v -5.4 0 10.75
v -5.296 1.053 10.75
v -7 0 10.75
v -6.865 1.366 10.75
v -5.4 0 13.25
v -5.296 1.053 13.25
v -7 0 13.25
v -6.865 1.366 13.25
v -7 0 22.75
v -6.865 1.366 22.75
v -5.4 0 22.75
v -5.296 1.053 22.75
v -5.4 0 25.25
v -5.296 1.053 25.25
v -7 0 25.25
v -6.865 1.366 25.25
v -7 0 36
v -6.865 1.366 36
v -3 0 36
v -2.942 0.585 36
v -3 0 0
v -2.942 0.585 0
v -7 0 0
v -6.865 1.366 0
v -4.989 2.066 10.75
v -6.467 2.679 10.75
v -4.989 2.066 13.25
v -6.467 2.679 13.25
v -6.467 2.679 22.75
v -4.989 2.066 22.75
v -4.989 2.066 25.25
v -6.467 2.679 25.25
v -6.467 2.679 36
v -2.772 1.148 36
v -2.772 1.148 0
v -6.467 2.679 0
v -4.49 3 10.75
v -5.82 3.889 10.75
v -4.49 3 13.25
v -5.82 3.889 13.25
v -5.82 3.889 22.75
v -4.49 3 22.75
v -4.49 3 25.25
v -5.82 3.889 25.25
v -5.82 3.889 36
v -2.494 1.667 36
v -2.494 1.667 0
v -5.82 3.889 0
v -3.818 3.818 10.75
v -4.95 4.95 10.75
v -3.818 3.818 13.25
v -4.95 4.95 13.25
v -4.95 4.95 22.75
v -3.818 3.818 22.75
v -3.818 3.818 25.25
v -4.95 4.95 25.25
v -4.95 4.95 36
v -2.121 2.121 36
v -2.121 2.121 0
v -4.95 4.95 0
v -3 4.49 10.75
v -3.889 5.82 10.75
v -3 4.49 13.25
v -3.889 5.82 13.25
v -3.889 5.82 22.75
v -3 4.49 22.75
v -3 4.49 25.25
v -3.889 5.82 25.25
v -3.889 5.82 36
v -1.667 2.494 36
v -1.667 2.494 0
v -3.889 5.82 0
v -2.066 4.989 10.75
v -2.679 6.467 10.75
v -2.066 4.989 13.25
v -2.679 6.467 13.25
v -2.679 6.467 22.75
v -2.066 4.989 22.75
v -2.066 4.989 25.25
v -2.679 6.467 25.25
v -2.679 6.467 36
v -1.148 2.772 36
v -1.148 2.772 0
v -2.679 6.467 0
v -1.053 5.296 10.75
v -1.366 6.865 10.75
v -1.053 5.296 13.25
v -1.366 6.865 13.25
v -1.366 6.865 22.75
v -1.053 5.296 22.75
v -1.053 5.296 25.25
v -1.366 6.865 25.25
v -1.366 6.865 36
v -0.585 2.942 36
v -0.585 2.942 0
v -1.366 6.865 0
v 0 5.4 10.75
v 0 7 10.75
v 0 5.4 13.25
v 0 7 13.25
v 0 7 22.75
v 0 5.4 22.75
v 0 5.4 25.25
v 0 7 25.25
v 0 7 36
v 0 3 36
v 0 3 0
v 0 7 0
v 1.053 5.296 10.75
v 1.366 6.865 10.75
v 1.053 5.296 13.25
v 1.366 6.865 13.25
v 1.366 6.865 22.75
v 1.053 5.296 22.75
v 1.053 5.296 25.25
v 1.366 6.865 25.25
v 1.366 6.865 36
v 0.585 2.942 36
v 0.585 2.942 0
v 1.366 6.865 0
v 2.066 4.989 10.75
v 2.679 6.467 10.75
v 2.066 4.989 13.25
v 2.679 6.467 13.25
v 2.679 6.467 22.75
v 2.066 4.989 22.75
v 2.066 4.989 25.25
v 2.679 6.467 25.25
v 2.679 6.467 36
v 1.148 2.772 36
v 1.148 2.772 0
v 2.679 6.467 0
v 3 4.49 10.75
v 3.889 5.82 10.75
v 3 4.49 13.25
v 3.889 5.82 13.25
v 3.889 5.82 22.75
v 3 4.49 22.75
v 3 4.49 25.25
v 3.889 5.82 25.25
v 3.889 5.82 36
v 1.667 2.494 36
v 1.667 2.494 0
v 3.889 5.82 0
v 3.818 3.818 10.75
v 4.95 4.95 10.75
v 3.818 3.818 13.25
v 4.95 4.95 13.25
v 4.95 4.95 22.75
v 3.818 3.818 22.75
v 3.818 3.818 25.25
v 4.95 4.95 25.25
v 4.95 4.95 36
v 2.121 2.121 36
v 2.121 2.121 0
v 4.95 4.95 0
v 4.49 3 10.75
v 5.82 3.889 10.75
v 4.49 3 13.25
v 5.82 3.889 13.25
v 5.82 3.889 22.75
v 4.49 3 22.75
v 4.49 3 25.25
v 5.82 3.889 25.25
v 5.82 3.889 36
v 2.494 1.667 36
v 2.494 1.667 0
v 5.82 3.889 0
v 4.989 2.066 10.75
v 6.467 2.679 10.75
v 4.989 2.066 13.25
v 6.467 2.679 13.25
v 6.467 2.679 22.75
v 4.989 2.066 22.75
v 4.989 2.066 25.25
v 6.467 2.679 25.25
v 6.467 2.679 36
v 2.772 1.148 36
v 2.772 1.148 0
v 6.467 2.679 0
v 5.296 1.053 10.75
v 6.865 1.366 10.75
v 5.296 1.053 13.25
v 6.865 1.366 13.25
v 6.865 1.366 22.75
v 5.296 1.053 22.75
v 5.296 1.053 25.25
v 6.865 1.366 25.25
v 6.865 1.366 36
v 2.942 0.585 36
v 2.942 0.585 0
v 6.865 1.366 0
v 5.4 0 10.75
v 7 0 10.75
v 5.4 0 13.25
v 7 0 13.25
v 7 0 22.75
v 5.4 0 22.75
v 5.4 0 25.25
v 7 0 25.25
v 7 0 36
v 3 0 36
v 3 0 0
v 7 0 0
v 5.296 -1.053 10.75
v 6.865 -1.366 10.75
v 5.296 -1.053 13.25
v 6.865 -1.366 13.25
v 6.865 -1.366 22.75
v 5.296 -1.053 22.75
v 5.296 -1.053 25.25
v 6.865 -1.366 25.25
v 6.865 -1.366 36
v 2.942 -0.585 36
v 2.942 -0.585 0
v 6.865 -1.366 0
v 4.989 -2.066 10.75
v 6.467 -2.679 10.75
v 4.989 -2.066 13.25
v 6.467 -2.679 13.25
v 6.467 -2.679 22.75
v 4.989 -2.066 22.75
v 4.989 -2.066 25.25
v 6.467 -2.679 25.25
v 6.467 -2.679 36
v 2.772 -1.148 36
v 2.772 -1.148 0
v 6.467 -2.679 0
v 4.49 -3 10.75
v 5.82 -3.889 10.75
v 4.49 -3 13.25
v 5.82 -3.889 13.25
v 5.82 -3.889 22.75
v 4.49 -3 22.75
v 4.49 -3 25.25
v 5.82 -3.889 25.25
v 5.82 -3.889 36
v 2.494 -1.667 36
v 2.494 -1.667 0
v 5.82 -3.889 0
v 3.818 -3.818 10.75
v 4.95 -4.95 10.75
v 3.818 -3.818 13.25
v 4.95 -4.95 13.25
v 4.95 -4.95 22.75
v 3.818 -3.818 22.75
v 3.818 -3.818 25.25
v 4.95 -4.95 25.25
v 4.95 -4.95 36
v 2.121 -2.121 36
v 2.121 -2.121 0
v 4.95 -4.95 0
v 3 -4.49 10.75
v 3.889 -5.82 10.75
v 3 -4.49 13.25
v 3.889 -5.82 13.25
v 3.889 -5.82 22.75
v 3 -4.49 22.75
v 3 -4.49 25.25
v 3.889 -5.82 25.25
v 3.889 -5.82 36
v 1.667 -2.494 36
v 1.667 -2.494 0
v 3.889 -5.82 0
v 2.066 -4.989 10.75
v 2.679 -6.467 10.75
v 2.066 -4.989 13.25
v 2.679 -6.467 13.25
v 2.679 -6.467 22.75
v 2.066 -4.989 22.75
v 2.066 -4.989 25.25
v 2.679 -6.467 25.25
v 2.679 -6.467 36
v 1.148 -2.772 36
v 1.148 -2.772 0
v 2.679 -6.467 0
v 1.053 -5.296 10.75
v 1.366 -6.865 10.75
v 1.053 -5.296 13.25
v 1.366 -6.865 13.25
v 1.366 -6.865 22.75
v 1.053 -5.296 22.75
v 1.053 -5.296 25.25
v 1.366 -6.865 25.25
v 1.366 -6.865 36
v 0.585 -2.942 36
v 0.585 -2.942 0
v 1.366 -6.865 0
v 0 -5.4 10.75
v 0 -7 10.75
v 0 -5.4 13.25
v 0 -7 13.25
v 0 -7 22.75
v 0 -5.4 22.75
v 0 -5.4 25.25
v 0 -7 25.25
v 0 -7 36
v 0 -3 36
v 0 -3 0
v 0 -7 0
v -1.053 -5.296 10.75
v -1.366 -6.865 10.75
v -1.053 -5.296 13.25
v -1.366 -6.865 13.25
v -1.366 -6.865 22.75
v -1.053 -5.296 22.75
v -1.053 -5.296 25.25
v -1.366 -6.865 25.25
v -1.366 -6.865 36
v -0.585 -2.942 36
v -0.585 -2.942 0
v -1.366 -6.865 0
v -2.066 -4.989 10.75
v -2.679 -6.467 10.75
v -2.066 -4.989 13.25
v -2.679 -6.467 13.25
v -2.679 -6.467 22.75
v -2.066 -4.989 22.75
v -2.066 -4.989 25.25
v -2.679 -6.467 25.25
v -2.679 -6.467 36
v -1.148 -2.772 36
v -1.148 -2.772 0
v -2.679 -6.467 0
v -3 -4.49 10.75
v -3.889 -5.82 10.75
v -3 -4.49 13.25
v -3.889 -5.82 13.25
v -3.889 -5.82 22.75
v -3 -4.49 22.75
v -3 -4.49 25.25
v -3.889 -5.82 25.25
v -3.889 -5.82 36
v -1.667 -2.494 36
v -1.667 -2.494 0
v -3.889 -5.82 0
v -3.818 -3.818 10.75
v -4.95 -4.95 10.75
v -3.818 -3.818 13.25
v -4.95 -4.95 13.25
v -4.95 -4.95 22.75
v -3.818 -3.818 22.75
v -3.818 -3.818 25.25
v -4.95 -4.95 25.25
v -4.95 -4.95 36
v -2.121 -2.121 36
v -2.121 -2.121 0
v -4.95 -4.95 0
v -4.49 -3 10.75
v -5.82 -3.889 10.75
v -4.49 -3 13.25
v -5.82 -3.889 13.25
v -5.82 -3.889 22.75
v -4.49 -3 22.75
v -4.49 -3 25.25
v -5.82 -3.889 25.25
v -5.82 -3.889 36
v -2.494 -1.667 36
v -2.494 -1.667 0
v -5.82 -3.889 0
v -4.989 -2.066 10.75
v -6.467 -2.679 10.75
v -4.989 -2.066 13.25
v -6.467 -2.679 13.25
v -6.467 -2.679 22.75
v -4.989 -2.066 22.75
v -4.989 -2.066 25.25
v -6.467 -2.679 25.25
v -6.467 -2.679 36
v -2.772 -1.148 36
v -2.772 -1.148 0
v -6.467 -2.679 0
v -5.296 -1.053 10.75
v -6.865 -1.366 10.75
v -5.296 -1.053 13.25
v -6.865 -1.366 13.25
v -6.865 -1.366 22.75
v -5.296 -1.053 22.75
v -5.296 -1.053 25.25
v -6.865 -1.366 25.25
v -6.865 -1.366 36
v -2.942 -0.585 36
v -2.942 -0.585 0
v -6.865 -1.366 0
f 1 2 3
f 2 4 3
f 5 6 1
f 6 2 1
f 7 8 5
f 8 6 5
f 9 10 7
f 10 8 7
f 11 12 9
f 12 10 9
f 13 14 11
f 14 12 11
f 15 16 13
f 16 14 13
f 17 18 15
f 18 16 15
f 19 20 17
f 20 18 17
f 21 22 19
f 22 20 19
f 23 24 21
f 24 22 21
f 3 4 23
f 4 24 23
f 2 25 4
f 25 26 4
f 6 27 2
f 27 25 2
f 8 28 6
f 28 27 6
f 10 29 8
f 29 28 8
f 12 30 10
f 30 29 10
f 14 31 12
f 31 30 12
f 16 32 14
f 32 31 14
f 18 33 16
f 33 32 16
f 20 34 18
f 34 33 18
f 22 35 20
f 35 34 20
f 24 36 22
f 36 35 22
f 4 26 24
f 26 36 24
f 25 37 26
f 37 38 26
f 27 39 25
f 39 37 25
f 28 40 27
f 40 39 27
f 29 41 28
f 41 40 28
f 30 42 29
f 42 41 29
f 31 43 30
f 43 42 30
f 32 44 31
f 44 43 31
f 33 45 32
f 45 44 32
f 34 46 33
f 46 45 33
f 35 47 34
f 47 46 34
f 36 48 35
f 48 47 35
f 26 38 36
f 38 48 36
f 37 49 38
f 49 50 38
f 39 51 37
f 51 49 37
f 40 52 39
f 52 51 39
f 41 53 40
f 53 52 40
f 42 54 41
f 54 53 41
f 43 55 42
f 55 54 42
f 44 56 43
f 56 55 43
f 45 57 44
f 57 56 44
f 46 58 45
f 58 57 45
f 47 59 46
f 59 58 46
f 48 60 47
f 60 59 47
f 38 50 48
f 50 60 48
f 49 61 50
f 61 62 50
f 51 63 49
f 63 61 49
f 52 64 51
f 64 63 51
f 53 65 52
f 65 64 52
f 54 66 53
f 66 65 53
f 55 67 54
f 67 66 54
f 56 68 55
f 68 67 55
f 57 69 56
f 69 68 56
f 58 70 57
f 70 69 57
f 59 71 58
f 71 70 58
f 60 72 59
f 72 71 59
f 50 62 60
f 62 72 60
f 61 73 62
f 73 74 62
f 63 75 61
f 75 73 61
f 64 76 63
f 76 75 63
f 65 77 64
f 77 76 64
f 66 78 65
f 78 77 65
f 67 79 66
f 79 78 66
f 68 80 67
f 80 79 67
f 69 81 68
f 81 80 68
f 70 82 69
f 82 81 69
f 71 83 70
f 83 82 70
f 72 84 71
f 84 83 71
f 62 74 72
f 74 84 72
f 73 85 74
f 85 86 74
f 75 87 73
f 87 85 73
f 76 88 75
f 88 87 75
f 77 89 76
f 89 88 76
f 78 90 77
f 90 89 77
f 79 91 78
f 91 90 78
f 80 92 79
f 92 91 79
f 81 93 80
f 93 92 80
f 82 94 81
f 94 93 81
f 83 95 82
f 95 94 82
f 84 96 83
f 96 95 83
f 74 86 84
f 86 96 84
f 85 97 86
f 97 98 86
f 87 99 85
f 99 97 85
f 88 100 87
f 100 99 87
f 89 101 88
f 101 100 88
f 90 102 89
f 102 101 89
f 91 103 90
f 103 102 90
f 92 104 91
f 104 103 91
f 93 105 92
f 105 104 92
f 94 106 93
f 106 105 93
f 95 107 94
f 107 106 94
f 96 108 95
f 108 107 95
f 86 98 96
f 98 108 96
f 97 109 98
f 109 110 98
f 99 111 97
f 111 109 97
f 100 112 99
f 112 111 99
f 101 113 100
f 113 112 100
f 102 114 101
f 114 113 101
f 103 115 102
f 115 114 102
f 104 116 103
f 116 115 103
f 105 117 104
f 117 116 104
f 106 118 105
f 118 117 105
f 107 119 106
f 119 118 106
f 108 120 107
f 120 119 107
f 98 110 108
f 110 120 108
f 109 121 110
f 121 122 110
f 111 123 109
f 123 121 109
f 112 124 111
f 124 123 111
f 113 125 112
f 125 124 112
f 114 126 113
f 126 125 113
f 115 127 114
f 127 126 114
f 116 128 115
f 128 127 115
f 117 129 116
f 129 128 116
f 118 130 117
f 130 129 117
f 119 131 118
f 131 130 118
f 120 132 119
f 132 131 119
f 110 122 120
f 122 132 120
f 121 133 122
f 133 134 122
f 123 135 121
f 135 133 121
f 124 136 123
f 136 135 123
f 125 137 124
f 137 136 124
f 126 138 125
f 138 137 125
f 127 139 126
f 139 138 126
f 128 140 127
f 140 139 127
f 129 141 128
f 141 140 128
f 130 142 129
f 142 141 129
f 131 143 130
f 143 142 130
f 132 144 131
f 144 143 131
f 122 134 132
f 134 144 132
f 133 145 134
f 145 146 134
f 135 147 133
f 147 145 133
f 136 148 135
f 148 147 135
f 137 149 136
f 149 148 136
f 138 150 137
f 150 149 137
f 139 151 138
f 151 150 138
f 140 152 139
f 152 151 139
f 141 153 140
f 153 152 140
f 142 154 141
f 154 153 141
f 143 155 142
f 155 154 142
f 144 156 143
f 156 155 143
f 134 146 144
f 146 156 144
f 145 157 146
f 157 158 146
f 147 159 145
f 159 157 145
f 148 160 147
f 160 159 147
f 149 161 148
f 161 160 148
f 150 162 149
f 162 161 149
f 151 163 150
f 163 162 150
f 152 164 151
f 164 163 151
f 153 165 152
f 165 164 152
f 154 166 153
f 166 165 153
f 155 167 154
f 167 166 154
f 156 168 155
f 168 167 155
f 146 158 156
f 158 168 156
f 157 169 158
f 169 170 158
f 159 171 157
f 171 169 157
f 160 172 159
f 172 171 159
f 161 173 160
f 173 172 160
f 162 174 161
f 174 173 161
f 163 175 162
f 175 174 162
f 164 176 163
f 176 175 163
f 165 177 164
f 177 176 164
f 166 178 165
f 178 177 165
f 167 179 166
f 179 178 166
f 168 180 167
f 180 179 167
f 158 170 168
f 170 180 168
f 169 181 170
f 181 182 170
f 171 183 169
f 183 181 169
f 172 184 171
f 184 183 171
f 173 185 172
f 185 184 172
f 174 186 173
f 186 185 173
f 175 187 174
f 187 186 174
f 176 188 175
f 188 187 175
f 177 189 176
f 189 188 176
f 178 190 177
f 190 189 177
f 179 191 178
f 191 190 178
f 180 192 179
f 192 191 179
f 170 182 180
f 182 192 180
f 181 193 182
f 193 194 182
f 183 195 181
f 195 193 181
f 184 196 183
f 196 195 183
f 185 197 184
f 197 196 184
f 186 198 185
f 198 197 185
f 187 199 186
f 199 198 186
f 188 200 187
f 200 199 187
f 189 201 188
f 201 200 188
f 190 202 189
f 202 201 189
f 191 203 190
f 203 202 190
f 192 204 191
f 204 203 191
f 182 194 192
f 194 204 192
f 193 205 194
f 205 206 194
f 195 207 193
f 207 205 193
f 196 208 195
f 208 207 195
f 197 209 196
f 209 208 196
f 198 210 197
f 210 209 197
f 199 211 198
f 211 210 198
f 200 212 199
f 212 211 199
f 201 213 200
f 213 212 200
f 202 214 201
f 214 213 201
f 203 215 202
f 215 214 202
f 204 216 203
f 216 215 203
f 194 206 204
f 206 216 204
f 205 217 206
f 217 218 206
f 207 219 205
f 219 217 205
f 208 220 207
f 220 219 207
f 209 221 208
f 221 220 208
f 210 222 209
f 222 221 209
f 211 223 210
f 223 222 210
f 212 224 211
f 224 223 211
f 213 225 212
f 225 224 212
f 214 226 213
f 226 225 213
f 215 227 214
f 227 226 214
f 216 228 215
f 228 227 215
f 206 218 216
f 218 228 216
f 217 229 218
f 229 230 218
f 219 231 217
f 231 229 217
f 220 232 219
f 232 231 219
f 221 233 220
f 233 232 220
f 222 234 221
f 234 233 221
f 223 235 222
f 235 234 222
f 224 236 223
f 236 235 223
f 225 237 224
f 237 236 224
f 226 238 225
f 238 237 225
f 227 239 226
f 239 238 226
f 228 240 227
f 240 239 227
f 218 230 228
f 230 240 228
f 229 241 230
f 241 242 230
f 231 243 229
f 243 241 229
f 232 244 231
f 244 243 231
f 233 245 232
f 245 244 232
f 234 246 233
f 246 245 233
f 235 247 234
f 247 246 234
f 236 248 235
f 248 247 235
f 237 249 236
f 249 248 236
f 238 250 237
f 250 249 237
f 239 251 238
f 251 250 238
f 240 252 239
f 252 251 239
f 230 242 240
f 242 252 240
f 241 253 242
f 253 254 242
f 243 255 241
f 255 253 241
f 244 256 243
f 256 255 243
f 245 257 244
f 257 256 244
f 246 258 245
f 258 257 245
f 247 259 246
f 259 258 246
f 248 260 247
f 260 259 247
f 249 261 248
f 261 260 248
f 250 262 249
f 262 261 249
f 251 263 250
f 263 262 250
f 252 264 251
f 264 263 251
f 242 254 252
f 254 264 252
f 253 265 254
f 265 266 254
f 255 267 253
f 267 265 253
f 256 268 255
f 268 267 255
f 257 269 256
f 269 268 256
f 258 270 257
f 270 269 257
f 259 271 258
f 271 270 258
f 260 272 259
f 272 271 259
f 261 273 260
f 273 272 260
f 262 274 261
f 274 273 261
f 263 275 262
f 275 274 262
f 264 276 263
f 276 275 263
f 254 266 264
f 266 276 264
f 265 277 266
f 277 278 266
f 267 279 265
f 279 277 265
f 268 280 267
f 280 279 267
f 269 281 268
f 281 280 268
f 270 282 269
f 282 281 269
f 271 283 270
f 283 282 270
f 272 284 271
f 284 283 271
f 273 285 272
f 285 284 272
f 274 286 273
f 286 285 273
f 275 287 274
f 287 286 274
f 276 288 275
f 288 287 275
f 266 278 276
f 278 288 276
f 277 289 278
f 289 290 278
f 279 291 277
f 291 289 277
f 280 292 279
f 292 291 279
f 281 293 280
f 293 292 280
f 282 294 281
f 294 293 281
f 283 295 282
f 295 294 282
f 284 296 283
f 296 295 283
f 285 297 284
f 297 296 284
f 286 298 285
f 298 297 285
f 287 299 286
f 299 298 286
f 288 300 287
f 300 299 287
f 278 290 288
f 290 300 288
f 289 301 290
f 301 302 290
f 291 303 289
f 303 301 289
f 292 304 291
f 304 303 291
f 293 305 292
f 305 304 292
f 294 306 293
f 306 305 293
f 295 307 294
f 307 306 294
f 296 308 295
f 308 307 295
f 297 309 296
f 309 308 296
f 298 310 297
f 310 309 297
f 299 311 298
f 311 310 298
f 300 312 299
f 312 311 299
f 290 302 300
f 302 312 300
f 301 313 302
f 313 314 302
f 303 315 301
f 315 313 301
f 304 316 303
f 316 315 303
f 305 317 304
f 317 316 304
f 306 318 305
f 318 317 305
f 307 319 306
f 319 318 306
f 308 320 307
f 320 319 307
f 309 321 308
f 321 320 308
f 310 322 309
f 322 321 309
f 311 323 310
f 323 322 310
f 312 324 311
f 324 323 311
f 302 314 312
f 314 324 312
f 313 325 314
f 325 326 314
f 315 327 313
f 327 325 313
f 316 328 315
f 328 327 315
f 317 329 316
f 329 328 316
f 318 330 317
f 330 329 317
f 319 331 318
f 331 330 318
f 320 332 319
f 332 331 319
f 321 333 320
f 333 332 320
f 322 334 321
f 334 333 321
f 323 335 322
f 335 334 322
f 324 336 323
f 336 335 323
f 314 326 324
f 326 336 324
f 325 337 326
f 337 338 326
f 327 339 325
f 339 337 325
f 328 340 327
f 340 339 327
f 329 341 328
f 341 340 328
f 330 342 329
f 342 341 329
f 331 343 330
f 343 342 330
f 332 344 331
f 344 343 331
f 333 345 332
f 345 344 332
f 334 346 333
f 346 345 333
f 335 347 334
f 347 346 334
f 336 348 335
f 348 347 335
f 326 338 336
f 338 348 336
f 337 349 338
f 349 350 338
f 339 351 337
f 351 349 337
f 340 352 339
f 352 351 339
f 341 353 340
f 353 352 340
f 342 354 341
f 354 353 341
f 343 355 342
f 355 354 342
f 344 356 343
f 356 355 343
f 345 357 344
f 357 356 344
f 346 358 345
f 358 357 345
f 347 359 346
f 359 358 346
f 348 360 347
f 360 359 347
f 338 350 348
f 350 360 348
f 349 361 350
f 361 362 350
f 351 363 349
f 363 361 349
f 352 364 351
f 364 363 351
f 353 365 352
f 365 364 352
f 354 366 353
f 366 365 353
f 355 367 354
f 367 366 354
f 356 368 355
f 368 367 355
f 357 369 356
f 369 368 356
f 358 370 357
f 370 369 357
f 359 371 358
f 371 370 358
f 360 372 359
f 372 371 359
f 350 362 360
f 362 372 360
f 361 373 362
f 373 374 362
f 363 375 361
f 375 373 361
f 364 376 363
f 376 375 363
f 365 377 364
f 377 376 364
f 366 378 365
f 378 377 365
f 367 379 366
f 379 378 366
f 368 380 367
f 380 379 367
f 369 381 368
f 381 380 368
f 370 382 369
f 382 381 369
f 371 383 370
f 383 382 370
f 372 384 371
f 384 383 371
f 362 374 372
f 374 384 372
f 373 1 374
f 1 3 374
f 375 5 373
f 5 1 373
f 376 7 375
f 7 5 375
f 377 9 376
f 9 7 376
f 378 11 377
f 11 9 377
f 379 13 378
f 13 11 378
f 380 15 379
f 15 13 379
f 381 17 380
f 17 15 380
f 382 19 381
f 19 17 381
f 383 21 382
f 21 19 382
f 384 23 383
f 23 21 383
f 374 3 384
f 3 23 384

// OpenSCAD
$fn = 32;

// ----------------------------------------------------------------------
// Grooved revolve: stepped, bore R3
// ----------------------------------------------------------------------

// --- parameters (mm) ---
bore_r = 3;               // bore radius
outer_r = 7;              // outer radius of the body
total_h = 36;             // overall height, Z
wall = 4;                 // radial wall thickness
groove_w = 2.5;           // groove width
groove_d = 1.6;           // groove depth
grooves = 2;              // number of outer grooves

bbox_x = 2 * outer_r;  // full diameter
bore_d = 2 * bore_r;  // bore diameter
body_d = 2 * outer_r;  // body diameter
revolve_angle = 360;  // full turn around the Z axis

profile = [[3, 0], [7, 0], [7, 10.75], [5.4, 10.75], [5.4, 13.25], [7, 13.25], [7, 22.75], [5.4, 22.75], [5.4, 25.25], [7, 25.25], [7, 36], [3, 36]];  // primary outline, 12 points, counter clockwise

// --- the one profile operation ---
rotate_extrude(angle = revolve_angle) polygon(points = profile);
